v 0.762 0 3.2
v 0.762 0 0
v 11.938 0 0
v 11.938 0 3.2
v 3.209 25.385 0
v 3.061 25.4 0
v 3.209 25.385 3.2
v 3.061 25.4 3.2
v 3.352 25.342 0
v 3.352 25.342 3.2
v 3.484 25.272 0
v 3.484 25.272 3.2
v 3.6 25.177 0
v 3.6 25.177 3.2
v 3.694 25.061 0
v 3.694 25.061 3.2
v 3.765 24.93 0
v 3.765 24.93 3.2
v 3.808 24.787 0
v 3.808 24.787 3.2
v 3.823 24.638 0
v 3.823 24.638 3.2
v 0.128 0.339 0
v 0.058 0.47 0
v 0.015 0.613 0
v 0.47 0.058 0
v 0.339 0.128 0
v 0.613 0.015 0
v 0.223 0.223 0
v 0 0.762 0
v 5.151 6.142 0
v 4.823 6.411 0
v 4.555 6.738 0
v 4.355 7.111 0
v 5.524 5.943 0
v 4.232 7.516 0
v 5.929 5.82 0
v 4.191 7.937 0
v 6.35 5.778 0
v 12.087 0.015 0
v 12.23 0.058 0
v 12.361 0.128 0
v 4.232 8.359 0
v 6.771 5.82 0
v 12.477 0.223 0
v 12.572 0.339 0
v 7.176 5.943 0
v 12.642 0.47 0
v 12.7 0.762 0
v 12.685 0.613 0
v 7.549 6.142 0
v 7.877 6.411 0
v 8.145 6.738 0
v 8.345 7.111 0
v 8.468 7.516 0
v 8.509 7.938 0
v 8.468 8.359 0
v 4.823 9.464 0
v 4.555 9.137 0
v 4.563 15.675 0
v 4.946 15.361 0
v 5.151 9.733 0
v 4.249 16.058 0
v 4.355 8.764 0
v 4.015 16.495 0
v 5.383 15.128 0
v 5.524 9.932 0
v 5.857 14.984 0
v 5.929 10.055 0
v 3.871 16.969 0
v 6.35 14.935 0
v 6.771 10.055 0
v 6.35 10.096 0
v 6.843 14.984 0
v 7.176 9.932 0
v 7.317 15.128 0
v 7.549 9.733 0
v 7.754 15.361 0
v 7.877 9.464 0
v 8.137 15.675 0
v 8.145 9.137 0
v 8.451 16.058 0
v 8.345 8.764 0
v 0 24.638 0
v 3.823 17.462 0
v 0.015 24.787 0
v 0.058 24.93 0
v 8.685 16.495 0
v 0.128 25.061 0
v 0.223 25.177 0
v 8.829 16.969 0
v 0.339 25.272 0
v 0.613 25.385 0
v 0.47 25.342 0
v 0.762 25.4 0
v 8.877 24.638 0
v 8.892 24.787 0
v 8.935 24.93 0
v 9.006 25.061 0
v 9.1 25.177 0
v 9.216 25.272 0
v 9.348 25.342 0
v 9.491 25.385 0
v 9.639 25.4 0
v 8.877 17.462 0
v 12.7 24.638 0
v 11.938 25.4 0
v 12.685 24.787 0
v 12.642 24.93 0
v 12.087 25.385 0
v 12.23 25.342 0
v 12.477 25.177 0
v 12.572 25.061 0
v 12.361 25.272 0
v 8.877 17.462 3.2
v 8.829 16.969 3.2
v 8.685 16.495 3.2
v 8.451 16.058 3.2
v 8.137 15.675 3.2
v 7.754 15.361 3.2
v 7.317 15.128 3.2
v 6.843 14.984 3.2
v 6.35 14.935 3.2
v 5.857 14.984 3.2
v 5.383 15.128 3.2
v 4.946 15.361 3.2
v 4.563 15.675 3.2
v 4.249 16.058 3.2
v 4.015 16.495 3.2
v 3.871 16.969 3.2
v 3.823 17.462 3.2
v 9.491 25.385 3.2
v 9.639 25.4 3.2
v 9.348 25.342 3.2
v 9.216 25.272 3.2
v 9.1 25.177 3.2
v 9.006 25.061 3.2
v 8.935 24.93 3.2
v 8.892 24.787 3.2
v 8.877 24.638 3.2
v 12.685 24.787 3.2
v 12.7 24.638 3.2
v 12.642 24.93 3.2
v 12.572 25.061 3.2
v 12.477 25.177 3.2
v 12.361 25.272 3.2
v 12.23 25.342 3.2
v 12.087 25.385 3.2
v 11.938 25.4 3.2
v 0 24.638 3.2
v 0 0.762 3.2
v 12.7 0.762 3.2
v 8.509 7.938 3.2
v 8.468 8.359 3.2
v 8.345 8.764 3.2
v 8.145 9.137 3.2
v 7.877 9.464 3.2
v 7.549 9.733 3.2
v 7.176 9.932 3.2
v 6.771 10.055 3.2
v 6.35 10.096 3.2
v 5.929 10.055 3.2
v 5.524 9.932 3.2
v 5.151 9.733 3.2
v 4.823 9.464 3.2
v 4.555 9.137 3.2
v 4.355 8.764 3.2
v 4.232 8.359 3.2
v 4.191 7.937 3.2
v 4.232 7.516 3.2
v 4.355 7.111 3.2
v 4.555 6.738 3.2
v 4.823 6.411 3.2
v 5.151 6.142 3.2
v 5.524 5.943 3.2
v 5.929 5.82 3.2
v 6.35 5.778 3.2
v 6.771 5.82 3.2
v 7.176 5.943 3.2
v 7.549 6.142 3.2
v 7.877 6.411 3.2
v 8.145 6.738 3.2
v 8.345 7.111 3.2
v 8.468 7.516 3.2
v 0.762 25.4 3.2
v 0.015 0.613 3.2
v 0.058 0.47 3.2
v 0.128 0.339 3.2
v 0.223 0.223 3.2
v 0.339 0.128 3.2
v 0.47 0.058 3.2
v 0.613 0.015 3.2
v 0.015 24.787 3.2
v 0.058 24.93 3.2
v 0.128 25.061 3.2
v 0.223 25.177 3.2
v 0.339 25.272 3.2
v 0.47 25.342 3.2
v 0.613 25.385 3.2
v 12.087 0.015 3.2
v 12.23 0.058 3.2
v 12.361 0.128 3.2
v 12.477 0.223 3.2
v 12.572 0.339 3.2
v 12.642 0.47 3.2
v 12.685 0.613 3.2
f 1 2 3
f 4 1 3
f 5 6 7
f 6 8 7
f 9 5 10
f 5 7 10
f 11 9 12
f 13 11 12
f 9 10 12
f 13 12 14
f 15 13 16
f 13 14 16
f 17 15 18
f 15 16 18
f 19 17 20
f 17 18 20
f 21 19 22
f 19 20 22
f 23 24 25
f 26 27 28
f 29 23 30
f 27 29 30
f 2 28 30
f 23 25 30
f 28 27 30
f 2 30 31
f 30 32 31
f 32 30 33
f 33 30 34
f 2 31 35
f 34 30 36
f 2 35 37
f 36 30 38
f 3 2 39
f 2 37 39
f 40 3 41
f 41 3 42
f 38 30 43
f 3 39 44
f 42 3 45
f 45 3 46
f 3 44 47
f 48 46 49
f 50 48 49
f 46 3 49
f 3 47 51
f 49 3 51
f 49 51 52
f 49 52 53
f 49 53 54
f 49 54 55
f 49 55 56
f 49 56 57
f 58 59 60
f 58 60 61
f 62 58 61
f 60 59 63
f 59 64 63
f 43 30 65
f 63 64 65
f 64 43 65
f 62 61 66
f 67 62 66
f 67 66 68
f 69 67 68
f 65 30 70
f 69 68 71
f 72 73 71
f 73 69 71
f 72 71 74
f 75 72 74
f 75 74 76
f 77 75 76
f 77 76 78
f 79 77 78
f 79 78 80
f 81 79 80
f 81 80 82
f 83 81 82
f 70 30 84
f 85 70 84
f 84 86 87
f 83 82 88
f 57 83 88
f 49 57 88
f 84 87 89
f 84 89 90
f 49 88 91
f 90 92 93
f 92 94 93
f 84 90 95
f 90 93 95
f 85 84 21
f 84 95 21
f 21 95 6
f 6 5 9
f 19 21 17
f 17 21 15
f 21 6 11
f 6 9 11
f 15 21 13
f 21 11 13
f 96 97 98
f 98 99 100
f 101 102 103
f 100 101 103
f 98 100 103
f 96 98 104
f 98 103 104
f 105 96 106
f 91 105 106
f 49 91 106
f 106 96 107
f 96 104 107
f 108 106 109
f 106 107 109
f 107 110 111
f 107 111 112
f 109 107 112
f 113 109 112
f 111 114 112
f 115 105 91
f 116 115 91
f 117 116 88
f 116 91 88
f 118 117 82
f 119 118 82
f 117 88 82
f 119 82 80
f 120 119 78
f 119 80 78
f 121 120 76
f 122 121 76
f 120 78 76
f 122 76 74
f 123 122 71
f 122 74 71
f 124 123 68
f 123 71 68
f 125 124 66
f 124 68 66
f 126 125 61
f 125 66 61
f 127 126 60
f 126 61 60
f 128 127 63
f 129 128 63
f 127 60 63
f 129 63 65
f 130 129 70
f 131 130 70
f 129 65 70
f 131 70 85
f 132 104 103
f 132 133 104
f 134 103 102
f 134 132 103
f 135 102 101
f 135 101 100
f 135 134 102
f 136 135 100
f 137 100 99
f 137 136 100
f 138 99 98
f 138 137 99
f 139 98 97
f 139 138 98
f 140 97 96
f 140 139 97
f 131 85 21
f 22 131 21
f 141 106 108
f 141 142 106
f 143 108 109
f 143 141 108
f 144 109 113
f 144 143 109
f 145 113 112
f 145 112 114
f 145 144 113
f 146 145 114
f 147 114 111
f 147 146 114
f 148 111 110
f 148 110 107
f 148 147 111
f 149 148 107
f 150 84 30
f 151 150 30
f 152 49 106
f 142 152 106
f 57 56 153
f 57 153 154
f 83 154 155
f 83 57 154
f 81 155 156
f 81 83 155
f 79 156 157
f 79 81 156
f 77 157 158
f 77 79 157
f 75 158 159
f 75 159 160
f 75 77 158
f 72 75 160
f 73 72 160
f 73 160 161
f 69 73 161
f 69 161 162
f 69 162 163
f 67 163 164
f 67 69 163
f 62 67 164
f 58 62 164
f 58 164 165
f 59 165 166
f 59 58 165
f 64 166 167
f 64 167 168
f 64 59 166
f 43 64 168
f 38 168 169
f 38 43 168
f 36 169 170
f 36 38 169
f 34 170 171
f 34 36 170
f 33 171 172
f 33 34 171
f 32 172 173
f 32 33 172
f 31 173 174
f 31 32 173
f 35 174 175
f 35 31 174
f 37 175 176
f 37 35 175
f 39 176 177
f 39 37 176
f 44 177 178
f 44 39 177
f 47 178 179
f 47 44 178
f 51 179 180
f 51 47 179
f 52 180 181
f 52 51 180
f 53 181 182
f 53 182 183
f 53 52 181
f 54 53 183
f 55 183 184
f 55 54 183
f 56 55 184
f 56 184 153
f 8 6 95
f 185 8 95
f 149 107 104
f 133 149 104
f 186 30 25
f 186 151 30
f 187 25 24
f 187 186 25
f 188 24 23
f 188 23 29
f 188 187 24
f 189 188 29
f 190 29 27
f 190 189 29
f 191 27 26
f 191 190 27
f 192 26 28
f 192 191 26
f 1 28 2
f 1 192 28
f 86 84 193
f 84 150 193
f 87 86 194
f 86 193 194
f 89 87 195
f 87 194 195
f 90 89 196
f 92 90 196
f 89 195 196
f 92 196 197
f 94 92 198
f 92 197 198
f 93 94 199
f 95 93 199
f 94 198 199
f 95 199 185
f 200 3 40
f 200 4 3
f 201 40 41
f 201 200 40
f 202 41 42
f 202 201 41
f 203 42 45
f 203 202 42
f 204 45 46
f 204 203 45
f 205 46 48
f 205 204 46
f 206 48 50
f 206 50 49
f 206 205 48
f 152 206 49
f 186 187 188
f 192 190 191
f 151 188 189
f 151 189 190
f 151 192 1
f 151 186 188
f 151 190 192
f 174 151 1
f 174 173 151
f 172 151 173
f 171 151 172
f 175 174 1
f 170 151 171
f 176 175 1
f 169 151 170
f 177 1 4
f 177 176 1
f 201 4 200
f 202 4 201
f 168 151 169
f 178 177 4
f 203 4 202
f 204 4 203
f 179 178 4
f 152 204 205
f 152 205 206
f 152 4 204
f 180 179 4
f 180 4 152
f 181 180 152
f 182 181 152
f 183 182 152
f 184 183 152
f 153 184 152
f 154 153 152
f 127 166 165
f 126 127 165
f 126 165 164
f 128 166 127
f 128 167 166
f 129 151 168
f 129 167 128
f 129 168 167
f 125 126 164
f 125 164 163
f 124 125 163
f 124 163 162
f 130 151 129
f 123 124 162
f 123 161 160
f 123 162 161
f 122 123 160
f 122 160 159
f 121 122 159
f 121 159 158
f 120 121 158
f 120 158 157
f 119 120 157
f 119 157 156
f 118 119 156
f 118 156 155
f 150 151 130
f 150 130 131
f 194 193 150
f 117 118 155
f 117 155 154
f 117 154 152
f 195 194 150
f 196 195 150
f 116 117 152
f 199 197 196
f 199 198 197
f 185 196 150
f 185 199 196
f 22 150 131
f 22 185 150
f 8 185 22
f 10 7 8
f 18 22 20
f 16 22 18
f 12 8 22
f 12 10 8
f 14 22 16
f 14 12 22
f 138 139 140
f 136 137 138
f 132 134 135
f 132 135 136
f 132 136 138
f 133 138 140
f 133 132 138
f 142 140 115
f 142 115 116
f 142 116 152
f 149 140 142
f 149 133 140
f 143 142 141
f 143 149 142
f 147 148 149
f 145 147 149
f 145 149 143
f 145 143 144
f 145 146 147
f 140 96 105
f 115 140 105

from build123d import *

# Parameters (mm, degrees)
SKETCH1_R           = 2.159
BOSS_EXTRUDE1_DEPTH = 3.2004
FILLET1_R           = 0.762


with BuildPart() as part:
    # Sketch1 → Boss-Extrude1 (new body)
    with BuildSketch(Plane.XY):
        with BuildLine():
            Line((0, 25.4), (0, 0))
            Line((0, 0), (12.7, 0))
            Line((12.7, 0), (12.7, 25.4))
            Line((12.7, 25.4), (8.8773, 25.4))
            Line((8.8773, 25.4), (8.8773, 17.4625))
            ThreePointArc((8.8773, 17.4625), (6.35, 14.9352), (3.8227, 17.4625))
            Line((3.8227, 17.4625), (3.8227, 25.4))
            Line((3.8227, 25.4), (0, 25.4))
        make_face()
        with Locations((6.35, 7.9375)):
            Circle(SKETCH1_R, mode=Mode.SUBTRACT)
    extrude(amount=BOSS_EXTRUDE1_DEPTH)

    # Fillet1
    fillet1_edges = [part.edges().sort_by_distance(p)[0] for p in [
        (3.8227, 25.4, 1.6002),
        (8.8773, 25.4, 1.6002),
        (12.7, 25.4, 1.6002),
        (12.7, 0, 1.6002),
        (0, 0, 1.6002),
        (0, 25.4, 1.6002),
    ]]
    fillet(fillet1_edges, radius=FILLET1_R)


solid = part.part
